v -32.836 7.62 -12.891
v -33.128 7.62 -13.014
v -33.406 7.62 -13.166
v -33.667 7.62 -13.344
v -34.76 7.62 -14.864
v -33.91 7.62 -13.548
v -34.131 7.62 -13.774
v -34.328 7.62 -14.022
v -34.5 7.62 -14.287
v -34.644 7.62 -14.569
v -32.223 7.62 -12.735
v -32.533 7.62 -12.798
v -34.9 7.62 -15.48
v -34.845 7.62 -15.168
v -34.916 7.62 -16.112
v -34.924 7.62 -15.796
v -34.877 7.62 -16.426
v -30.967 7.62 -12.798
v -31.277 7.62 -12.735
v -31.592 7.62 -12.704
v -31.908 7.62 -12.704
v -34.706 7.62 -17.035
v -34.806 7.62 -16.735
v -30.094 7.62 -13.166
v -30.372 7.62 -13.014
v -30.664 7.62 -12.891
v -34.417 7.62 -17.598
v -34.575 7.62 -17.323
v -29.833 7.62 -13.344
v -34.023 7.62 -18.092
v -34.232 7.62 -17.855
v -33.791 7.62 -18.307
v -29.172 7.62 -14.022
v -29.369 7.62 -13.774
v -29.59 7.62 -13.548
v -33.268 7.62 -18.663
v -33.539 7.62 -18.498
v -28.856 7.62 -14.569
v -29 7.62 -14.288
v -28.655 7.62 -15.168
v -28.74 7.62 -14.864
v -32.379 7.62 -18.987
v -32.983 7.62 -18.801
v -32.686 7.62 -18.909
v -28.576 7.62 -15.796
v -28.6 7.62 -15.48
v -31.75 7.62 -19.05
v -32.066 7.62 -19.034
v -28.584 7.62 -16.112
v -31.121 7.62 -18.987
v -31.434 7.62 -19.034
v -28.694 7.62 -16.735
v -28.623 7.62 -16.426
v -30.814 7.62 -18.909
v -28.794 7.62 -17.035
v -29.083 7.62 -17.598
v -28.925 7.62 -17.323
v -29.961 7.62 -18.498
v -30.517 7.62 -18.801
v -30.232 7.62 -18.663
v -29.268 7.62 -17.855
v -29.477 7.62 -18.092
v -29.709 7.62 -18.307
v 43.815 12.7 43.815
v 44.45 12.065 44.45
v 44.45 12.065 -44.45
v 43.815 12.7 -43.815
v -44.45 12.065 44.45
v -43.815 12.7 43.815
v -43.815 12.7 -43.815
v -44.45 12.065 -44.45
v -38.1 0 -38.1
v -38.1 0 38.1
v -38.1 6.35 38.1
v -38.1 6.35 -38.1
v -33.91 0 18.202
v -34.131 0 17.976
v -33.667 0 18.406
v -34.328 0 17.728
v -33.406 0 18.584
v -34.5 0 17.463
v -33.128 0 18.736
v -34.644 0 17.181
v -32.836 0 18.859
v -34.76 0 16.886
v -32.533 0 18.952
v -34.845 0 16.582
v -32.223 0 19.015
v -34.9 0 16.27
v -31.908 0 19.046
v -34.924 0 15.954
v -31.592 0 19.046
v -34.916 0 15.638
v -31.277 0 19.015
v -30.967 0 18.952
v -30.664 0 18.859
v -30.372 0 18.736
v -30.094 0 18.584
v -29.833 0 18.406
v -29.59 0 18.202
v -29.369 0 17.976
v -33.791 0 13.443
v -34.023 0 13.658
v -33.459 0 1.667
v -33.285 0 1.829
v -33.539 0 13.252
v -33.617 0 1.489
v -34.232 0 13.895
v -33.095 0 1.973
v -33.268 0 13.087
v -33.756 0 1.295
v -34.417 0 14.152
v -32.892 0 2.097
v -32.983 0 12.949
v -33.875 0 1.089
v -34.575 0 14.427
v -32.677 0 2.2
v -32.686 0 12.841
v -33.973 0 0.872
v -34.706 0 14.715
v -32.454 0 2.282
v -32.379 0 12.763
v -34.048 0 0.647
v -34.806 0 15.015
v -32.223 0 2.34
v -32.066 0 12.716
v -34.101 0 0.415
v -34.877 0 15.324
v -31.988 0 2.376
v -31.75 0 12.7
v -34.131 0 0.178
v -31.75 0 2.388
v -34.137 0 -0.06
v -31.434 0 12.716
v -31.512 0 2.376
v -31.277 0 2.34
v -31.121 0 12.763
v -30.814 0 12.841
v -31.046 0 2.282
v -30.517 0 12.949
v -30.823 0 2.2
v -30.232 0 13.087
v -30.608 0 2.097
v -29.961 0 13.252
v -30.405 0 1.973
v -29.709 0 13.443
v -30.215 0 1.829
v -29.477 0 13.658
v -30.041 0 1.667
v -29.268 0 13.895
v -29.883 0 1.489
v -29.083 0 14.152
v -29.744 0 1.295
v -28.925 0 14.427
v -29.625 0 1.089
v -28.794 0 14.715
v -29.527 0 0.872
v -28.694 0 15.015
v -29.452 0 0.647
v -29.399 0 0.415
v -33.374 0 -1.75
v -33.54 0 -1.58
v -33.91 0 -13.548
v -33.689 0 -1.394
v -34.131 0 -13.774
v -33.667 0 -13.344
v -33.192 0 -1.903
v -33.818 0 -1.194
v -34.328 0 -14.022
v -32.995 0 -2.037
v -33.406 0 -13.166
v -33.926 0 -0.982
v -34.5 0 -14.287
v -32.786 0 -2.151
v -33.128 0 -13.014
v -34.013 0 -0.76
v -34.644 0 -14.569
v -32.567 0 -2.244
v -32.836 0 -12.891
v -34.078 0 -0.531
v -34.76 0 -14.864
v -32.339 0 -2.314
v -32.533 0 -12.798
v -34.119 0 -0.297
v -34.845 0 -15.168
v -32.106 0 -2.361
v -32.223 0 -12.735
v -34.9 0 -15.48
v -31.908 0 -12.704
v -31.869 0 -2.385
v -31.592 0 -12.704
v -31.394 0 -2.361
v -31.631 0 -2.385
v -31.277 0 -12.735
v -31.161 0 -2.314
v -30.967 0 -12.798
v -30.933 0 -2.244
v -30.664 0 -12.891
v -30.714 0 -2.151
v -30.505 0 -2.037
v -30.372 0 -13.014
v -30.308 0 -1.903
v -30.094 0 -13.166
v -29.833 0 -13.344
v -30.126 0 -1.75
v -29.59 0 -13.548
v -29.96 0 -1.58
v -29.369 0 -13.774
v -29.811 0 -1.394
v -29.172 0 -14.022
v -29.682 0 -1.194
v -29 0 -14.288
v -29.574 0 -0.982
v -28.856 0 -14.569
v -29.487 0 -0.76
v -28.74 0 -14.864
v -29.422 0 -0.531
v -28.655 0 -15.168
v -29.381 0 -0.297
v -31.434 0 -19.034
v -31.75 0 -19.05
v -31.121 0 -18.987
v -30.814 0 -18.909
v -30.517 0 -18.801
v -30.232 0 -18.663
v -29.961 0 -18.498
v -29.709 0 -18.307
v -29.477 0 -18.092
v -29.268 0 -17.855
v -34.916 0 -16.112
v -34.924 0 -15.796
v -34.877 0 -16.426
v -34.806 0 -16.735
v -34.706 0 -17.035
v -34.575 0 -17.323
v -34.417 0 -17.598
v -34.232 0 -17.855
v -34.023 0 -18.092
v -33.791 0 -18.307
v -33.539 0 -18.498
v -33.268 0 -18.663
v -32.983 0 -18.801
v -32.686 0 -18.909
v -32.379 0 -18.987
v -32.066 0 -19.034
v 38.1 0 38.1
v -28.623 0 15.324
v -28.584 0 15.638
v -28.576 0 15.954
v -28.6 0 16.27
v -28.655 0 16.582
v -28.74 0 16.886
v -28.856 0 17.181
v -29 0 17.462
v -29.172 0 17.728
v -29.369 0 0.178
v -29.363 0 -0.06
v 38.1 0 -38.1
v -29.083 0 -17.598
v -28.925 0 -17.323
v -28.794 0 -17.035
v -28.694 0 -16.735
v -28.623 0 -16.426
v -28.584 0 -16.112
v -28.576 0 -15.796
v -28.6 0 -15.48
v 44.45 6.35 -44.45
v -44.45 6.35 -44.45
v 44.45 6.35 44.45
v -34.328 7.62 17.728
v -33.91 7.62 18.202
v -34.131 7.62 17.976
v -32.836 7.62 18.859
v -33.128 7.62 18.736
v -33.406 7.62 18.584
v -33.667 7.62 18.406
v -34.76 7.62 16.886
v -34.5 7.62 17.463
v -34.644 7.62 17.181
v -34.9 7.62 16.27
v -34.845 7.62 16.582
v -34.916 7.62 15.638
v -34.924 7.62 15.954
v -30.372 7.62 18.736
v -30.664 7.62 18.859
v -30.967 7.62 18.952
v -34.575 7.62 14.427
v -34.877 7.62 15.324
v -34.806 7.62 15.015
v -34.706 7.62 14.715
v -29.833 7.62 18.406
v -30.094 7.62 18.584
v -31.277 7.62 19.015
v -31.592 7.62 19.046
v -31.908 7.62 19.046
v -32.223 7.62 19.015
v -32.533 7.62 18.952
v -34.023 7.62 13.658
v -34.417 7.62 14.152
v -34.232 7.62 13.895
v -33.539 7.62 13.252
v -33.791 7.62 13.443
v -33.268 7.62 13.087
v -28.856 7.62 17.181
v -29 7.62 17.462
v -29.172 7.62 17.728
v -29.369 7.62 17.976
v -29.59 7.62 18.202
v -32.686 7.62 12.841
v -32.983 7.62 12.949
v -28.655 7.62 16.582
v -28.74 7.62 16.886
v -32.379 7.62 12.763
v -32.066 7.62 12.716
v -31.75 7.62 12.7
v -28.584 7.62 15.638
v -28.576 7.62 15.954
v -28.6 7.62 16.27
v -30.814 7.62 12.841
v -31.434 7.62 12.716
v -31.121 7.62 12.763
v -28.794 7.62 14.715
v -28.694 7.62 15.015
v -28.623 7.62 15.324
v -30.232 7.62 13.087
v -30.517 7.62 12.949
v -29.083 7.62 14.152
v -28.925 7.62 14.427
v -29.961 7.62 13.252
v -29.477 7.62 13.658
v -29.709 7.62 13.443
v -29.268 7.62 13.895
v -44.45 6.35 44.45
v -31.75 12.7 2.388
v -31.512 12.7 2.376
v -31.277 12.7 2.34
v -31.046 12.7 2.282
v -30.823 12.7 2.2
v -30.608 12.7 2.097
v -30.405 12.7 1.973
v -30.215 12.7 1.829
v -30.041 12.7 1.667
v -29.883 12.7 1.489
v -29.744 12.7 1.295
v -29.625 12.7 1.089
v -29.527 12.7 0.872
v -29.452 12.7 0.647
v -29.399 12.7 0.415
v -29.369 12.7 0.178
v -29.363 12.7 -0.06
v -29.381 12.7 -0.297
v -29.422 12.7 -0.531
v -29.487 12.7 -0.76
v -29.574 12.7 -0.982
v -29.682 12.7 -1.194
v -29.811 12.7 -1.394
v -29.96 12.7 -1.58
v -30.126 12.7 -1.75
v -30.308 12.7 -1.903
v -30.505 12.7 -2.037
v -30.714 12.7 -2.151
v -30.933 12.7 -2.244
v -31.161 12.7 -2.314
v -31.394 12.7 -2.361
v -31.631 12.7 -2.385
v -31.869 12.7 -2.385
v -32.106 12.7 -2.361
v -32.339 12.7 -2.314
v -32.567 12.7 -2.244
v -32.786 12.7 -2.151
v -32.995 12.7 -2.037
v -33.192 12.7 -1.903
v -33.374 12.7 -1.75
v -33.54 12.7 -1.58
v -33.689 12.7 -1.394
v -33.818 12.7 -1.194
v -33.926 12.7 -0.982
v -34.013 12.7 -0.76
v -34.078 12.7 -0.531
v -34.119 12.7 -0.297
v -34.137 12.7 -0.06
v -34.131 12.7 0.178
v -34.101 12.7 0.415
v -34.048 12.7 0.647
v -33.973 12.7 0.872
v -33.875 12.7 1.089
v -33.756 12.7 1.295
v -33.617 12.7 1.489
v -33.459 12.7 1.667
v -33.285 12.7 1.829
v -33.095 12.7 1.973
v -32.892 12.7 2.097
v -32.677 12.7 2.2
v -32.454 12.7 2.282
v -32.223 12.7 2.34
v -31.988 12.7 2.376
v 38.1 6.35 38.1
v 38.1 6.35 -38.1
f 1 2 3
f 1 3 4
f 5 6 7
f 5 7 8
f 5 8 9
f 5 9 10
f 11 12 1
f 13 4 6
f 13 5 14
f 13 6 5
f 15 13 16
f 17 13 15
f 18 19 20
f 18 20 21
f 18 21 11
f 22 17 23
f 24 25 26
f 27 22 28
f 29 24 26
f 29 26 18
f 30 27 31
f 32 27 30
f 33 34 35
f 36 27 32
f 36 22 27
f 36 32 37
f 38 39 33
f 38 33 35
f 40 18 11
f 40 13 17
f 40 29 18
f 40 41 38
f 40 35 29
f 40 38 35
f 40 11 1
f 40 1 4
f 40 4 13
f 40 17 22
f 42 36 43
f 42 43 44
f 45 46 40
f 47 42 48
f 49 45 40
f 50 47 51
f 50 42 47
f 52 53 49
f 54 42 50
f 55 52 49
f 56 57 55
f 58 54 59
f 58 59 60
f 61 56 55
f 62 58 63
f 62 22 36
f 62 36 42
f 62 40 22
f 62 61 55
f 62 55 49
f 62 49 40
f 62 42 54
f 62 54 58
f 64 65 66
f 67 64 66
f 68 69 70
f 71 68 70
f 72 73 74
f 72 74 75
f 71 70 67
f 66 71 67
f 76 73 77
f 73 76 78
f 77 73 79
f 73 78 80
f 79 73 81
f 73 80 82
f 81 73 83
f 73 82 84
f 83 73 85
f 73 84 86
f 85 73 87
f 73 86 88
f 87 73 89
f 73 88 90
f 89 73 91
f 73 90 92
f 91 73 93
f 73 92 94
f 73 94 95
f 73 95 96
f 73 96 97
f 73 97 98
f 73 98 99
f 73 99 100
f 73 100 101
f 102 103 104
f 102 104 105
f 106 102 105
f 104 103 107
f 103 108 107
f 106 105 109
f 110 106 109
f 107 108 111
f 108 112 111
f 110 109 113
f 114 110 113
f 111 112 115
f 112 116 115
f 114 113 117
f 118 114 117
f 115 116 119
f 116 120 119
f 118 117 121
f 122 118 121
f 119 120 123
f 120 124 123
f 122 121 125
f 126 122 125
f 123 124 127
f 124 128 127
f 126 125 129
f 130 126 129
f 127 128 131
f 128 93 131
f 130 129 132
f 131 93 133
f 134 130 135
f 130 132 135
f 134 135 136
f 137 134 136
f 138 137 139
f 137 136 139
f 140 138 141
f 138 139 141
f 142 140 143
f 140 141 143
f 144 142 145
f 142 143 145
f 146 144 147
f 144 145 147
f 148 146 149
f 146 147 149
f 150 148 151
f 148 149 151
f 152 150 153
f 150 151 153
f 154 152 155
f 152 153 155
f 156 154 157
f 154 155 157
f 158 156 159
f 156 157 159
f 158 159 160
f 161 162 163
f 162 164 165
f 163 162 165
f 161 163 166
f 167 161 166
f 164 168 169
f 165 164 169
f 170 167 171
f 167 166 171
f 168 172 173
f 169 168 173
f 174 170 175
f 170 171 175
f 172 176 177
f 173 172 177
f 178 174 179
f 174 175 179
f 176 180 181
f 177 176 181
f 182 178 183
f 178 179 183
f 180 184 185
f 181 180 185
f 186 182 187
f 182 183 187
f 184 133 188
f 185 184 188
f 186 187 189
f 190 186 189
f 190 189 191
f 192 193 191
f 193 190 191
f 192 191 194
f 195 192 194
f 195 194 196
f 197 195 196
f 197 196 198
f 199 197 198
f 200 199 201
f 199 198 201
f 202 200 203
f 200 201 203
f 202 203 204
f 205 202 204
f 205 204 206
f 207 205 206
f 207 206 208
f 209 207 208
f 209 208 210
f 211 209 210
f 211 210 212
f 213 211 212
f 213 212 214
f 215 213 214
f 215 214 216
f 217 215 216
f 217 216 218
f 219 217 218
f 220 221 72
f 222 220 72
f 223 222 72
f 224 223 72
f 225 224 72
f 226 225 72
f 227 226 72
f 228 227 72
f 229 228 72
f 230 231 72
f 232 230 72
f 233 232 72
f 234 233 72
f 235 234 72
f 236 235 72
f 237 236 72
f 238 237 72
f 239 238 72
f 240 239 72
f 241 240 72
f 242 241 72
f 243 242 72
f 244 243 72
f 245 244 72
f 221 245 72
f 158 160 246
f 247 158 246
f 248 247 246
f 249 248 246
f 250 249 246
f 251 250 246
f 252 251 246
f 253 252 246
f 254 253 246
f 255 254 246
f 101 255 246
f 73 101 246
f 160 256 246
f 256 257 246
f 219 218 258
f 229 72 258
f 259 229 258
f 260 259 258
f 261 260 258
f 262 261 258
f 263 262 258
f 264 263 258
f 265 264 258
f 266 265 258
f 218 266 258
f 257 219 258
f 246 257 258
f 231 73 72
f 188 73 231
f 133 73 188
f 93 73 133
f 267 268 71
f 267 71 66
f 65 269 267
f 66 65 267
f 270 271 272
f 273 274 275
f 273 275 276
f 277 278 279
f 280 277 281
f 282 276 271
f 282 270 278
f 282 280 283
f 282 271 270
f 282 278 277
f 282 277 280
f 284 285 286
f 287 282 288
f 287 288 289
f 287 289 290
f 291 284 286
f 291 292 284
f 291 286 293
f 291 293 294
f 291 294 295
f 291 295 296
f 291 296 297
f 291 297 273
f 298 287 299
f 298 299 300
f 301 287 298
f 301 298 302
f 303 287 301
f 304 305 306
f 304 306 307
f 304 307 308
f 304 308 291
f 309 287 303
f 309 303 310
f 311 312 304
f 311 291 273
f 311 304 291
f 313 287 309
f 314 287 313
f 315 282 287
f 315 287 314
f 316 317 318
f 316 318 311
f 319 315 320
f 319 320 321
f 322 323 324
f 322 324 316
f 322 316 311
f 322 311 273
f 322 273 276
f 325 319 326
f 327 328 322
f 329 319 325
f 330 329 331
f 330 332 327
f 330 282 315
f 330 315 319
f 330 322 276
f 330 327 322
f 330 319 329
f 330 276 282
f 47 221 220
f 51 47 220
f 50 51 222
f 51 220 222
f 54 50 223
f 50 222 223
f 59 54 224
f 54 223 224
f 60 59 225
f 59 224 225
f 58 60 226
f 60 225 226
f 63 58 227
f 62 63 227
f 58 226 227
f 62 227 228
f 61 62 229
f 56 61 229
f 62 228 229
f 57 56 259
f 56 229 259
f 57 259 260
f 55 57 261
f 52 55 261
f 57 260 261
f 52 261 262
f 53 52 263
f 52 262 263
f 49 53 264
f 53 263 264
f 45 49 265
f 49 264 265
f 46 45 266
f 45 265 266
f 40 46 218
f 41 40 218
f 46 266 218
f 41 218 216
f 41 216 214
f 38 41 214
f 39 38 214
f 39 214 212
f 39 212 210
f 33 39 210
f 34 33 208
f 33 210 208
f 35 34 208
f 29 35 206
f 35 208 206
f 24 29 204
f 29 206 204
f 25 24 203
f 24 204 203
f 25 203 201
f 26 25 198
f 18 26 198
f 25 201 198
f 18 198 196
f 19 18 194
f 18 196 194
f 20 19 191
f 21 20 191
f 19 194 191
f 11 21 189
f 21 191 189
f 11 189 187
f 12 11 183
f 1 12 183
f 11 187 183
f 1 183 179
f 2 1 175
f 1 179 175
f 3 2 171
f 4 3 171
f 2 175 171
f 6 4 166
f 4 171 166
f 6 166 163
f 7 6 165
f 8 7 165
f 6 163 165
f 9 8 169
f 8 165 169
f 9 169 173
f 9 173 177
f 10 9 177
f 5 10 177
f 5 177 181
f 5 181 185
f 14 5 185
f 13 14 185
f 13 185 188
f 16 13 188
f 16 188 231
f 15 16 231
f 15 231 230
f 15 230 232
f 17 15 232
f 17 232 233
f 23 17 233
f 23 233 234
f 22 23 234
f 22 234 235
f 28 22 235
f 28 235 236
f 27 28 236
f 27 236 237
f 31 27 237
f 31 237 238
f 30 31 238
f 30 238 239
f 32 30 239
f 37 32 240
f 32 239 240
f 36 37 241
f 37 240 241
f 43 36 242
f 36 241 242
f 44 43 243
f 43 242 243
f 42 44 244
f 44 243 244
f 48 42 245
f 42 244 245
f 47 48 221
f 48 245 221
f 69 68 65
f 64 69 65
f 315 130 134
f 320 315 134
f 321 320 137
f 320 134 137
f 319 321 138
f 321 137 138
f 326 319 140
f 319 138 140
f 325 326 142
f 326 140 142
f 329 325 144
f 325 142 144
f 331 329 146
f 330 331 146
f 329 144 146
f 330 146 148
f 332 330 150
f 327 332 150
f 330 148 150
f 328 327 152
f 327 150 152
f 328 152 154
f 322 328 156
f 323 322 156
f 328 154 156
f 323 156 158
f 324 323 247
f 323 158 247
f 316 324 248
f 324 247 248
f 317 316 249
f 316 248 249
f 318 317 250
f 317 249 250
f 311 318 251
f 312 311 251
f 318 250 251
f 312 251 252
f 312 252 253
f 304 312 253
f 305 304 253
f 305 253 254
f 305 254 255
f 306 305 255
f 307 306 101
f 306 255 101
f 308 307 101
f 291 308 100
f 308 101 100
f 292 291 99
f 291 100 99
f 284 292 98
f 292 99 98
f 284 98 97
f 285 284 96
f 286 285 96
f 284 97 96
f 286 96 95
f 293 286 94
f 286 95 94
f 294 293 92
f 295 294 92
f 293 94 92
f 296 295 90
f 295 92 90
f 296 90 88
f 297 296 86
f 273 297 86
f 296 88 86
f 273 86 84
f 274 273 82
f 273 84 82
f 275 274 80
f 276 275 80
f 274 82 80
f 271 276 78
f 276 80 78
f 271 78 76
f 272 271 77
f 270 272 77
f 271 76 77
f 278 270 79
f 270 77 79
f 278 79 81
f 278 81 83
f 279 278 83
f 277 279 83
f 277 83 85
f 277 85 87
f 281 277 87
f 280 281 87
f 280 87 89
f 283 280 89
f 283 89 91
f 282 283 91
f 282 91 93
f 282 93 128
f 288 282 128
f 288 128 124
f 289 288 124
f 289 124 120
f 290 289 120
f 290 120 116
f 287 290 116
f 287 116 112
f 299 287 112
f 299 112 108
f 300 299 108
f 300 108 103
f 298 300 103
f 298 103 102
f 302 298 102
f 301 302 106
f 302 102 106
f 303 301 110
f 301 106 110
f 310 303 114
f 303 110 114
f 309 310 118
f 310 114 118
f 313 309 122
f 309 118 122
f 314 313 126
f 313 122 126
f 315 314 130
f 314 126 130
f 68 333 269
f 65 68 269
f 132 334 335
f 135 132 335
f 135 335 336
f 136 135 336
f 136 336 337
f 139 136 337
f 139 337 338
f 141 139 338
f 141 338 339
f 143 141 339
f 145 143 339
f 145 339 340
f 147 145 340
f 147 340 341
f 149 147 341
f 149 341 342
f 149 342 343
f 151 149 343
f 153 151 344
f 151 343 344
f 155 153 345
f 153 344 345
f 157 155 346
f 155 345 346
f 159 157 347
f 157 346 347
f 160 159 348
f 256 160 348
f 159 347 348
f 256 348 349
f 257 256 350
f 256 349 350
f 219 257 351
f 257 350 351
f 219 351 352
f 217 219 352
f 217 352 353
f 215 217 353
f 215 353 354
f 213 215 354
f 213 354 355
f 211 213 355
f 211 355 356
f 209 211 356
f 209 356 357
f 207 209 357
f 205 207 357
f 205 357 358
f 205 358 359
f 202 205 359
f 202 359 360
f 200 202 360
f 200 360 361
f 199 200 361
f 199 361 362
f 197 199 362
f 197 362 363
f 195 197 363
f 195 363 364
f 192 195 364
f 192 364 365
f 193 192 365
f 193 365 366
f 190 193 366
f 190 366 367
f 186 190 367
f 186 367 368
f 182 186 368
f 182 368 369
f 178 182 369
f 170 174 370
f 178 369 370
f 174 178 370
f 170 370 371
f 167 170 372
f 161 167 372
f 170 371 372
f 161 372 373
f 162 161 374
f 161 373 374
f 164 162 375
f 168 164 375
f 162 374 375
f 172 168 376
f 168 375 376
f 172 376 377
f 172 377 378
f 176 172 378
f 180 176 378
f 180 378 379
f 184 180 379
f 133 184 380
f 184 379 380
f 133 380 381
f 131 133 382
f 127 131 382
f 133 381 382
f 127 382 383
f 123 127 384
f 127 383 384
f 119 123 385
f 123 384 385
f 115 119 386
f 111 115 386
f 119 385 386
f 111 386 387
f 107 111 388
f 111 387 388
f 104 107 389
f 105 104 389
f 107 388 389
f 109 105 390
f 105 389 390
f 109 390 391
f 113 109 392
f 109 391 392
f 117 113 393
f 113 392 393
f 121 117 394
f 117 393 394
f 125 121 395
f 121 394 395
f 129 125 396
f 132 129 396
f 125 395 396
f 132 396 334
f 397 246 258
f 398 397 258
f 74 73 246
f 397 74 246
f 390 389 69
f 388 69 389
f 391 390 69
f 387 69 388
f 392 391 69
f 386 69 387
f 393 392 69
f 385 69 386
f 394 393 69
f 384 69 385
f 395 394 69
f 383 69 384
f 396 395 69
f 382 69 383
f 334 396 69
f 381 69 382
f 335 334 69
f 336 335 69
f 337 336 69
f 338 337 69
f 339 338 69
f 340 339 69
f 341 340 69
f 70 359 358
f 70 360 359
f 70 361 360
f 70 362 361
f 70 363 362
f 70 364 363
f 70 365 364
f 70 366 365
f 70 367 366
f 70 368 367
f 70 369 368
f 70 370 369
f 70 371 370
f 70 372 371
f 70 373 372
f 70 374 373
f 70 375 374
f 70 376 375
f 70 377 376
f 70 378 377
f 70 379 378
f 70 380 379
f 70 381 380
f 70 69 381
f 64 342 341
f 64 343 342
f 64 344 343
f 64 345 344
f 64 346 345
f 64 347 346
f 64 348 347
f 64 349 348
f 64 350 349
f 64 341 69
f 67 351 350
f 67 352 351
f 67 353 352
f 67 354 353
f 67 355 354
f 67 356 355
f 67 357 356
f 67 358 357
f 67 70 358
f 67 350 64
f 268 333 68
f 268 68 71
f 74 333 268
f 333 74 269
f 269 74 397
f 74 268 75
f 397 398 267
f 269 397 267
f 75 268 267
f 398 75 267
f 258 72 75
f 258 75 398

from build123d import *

# Parameters (mm, degrees)
SKETCH1_W           = 88.9
SKETCH1_H           = 88.9
BOSS_EXTRUDE1_DEPTH = 12.7
SKETCH2_OUTSIDE_W   = 116.172
SKETCH2_OUTSIDE_H   = 116.172
SKETCH2_OUTSIDE_W_2 = 76.2
SKETCH2_OUTSIDE_H_2 = 76.2
CUT_EXTRUDE3_DEPTH  = 6.35
SKETCH3_R           = 2.3876
CUT_EXTRUDE4_DEPTH  = 65.131856359
CHAMFER1_SIZE       = 0.635
SKETCH4_R           = 3.175
CUT_EXTRUDE5_DEPTH  = 7.62


with BuildPart() as part:
    # Sketch1 → Boss-Extrude1 (new body)
    with BuildSketch(Plane(origin=(0, 0, 0), x_dir=(1, 0, 0), z_dir=(0, 1, 0))):
        Rectangle(SKETCH1_W, SKETCH1_H)
    extrude(amount=BOSS_EXTRUDE1_DEPTH)

    # Sketch2 outside → Cut-Extrude3 (cut)
    with BuildSketch(Plane(origin=(0, 0, 0), x_dir=(1, 0, 0), z_dir=(0, 1, 0))):
        Rectangle(SKETCH2_OUTSIDE_W, SKETCH2_OUTSIDE_H)
        Rectangle(SKETCH2_OUTSIDE_W_2, SKETCH2_OUTSIDE_H_2, mode=Mode.SUBTRACT)
    extrude(amount=CUT_EXTRUDE3_DEPTH, mode=Mode.SUBTRACT)

    # Sketch3 → Cut-Extrude4 (cut, through all)
    with BuildSketch(Plane(origin=(0, 12.7, 0), x_dir=(1, 0, 0), z_dir=(0, 1, 0))):
        with Locations(Location((-31.75, 0, 0), (0, 0, 270))):
            Circle(SKETCH3_R)
    extrude(amount=-CUT_EXTRUDE4_DEPTH, mode=Mode.SUBTRACT)

    # Chamfer1
    chamfer1_edges = [part.edges().sort_by_distance(p)[0] for p in [
        (-44.45, 12.7, 0),
        (0, 12.7, 44.45),
        (44.45, 12.7, 0),
        (0, 12.7, -44.45),
    ]]
    chamfer(chamfer1_edges, length=CHAMFER1_SIZE)

    # Sketch4 → Cut-Extrude5 (cut)
    with BuildSketch(Plane.XZ):
        with Locations(Location((-31.75, 15.875, 0), (0, 0, 270))):
            Circle(SKETCH4_R)
        with Locations(Location((-31.75, -15.875, 0), (0, 0, 270))):
            Circle(SKETCH4_R)
    extrude(amount=-CUT_EXTRUDE5_DEPTH, mode=Mode.SUBTRACT)


solid = part.part
